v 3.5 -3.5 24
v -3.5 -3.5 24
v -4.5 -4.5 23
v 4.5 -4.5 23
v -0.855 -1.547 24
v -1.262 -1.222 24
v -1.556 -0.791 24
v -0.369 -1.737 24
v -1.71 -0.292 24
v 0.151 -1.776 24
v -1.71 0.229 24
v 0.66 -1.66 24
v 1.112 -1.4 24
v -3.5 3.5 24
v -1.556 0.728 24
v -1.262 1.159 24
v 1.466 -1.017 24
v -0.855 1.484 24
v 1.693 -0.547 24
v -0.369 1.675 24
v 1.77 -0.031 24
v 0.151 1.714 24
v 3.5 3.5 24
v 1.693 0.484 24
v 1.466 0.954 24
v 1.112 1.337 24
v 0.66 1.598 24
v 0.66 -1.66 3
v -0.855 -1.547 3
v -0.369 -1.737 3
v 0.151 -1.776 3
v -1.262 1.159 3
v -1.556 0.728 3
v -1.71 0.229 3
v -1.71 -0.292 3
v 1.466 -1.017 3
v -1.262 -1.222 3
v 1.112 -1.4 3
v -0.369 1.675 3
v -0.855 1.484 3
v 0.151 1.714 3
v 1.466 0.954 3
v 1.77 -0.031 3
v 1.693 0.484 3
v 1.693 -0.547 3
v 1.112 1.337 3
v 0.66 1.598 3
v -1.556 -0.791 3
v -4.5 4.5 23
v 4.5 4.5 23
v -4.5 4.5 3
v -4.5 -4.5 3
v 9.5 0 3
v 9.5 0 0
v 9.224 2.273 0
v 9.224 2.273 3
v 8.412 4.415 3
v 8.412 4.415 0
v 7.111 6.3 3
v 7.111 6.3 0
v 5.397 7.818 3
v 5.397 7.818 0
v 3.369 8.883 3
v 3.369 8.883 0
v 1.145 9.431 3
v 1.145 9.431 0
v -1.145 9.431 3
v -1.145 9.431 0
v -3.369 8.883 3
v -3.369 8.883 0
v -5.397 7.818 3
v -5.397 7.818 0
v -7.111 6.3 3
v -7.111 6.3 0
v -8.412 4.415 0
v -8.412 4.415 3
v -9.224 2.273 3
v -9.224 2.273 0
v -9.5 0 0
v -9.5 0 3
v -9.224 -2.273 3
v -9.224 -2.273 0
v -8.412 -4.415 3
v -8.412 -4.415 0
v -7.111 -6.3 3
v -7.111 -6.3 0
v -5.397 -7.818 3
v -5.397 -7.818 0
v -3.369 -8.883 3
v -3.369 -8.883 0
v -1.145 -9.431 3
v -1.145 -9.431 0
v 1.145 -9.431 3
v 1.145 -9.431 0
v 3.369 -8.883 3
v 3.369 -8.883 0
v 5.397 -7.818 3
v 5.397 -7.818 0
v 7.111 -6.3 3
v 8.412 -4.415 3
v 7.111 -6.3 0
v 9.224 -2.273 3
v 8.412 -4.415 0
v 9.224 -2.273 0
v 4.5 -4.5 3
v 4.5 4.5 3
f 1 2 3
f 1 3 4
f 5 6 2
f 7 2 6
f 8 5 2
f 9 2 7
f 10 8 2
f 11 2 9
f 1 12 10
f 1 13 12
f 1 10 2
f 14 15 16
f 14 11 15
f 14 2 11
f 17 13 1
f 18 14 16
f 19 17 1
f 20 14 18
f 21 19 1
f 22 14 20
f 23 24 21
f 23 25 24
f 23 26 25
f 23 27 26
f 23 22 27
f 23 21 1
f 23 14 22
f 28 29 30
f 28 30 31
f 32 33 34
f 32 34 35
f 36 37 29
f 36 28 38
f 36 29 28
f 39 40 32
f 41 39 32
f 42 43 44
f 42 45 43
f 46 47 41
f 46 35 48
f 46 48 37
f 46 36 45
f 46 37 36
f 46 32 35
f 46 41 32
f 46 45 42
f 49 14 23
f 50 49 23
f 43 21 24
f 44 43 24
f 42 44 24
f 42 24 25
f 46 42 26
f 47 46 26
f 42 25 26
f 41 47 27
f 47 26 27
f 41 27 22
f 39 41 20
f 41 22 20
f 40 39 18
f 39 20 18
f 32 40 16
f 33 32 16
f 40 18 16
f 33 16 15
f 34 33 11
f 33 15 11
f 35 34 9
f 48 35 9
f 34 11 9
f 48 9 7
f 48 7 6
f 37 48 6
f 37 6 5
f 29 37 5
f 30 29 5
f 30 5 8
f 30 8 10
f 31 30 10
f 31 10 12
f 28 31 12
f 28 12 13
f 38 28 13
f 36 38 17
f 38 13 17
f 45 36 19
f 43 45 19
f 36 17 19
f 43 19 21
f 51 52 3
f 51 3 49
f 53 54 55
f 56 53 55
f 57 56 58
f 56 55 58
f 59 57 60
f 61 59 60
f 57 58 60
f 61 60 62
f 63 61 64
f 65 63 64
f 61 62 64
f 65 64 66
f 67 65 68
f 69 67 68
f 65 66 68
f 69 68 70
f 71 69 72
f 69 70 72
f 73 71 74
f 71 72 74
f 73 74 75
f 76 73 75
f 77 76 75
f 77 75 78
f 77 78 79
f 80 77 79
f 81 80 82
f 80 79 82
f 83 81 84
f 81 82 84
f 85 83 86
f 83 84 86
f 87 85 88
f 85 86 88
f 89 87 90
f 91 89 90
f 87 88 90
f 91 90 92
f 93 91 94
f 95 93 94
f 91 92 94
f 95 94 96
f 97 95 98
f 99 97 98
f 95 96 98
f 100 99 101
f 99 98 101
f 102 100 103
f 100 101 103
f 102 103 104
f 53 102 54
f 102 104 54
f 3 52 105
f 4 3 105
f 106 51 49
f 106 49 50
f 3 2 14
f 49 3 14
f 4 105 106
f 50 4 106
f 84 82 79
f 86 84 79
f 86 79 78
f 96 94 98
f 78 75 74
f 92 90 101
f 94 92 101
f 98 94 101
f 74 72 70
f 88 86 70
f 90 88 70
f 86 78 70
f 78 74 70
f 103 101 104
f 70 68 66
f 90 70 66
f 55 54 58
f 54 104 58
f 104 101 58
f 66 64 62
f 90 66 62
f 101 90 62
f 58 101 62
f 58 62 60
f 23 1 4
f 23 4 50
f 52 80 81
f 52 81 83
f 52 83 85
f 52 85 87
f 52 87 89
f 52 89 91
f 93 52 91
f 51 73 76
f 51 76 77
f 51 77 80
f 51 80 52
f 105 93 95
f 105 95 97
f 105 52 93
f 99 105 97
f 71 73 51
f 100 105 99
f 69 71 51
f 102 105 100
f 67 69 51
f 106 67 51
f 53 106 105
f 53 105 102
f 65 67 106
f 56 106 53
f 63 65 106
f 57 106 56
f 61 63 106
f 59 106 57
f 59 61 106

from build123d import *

# Parameters (mm, degrees)
SKETCH_R     = 9.5
PAD_DEPTH    = 3
SKETCH002_W  = 9
SKETCH002_H  = 9
PAD001_DEPTH = 21
CHAMFER_SIZE = 1
SKETCH003_R  = 1.75
POCKET_DEPTH = 21


with BuildPart() as part:
    # Sketch → Pad (new body)
    with BuildSketch(Plane.XY):
        Circle(SKETCH_R)
    extrude(amount=PAD_DEPTH)

    # Sketch002 (on Face3 of Pad) → Pad001 (join)
    with BuildSketch(Plane.XY.offset(3)):
        Rectangle(SKETCH002_W, SKETCH002_H)
    extrude(amount=PAD001_DEPTH)

    # Chamfer
    chamfer_edges = [part.edges().sort_by_distance(p)[0] for p in [
        (0, 4.5, 24),
        (-4.5, 0, 24),
        (0, -4.5, 24),
        (4.5, 0, 24),
    ]]
    chamfer(chamfer_edges, length=CHAMFER_SIZE)

    # Sketch003 (on Face8 of Chamfer) → Pocket (cut)
    with BuildSketch(Plane.XY.offset(24)):
        with Locations((0.020416, -0.031336)):
            Circle(SKETCH003_R)
    extrude(amount=-POCKET_DEPTH, mode=Mode.SUBTRACT)


solid = part.part
